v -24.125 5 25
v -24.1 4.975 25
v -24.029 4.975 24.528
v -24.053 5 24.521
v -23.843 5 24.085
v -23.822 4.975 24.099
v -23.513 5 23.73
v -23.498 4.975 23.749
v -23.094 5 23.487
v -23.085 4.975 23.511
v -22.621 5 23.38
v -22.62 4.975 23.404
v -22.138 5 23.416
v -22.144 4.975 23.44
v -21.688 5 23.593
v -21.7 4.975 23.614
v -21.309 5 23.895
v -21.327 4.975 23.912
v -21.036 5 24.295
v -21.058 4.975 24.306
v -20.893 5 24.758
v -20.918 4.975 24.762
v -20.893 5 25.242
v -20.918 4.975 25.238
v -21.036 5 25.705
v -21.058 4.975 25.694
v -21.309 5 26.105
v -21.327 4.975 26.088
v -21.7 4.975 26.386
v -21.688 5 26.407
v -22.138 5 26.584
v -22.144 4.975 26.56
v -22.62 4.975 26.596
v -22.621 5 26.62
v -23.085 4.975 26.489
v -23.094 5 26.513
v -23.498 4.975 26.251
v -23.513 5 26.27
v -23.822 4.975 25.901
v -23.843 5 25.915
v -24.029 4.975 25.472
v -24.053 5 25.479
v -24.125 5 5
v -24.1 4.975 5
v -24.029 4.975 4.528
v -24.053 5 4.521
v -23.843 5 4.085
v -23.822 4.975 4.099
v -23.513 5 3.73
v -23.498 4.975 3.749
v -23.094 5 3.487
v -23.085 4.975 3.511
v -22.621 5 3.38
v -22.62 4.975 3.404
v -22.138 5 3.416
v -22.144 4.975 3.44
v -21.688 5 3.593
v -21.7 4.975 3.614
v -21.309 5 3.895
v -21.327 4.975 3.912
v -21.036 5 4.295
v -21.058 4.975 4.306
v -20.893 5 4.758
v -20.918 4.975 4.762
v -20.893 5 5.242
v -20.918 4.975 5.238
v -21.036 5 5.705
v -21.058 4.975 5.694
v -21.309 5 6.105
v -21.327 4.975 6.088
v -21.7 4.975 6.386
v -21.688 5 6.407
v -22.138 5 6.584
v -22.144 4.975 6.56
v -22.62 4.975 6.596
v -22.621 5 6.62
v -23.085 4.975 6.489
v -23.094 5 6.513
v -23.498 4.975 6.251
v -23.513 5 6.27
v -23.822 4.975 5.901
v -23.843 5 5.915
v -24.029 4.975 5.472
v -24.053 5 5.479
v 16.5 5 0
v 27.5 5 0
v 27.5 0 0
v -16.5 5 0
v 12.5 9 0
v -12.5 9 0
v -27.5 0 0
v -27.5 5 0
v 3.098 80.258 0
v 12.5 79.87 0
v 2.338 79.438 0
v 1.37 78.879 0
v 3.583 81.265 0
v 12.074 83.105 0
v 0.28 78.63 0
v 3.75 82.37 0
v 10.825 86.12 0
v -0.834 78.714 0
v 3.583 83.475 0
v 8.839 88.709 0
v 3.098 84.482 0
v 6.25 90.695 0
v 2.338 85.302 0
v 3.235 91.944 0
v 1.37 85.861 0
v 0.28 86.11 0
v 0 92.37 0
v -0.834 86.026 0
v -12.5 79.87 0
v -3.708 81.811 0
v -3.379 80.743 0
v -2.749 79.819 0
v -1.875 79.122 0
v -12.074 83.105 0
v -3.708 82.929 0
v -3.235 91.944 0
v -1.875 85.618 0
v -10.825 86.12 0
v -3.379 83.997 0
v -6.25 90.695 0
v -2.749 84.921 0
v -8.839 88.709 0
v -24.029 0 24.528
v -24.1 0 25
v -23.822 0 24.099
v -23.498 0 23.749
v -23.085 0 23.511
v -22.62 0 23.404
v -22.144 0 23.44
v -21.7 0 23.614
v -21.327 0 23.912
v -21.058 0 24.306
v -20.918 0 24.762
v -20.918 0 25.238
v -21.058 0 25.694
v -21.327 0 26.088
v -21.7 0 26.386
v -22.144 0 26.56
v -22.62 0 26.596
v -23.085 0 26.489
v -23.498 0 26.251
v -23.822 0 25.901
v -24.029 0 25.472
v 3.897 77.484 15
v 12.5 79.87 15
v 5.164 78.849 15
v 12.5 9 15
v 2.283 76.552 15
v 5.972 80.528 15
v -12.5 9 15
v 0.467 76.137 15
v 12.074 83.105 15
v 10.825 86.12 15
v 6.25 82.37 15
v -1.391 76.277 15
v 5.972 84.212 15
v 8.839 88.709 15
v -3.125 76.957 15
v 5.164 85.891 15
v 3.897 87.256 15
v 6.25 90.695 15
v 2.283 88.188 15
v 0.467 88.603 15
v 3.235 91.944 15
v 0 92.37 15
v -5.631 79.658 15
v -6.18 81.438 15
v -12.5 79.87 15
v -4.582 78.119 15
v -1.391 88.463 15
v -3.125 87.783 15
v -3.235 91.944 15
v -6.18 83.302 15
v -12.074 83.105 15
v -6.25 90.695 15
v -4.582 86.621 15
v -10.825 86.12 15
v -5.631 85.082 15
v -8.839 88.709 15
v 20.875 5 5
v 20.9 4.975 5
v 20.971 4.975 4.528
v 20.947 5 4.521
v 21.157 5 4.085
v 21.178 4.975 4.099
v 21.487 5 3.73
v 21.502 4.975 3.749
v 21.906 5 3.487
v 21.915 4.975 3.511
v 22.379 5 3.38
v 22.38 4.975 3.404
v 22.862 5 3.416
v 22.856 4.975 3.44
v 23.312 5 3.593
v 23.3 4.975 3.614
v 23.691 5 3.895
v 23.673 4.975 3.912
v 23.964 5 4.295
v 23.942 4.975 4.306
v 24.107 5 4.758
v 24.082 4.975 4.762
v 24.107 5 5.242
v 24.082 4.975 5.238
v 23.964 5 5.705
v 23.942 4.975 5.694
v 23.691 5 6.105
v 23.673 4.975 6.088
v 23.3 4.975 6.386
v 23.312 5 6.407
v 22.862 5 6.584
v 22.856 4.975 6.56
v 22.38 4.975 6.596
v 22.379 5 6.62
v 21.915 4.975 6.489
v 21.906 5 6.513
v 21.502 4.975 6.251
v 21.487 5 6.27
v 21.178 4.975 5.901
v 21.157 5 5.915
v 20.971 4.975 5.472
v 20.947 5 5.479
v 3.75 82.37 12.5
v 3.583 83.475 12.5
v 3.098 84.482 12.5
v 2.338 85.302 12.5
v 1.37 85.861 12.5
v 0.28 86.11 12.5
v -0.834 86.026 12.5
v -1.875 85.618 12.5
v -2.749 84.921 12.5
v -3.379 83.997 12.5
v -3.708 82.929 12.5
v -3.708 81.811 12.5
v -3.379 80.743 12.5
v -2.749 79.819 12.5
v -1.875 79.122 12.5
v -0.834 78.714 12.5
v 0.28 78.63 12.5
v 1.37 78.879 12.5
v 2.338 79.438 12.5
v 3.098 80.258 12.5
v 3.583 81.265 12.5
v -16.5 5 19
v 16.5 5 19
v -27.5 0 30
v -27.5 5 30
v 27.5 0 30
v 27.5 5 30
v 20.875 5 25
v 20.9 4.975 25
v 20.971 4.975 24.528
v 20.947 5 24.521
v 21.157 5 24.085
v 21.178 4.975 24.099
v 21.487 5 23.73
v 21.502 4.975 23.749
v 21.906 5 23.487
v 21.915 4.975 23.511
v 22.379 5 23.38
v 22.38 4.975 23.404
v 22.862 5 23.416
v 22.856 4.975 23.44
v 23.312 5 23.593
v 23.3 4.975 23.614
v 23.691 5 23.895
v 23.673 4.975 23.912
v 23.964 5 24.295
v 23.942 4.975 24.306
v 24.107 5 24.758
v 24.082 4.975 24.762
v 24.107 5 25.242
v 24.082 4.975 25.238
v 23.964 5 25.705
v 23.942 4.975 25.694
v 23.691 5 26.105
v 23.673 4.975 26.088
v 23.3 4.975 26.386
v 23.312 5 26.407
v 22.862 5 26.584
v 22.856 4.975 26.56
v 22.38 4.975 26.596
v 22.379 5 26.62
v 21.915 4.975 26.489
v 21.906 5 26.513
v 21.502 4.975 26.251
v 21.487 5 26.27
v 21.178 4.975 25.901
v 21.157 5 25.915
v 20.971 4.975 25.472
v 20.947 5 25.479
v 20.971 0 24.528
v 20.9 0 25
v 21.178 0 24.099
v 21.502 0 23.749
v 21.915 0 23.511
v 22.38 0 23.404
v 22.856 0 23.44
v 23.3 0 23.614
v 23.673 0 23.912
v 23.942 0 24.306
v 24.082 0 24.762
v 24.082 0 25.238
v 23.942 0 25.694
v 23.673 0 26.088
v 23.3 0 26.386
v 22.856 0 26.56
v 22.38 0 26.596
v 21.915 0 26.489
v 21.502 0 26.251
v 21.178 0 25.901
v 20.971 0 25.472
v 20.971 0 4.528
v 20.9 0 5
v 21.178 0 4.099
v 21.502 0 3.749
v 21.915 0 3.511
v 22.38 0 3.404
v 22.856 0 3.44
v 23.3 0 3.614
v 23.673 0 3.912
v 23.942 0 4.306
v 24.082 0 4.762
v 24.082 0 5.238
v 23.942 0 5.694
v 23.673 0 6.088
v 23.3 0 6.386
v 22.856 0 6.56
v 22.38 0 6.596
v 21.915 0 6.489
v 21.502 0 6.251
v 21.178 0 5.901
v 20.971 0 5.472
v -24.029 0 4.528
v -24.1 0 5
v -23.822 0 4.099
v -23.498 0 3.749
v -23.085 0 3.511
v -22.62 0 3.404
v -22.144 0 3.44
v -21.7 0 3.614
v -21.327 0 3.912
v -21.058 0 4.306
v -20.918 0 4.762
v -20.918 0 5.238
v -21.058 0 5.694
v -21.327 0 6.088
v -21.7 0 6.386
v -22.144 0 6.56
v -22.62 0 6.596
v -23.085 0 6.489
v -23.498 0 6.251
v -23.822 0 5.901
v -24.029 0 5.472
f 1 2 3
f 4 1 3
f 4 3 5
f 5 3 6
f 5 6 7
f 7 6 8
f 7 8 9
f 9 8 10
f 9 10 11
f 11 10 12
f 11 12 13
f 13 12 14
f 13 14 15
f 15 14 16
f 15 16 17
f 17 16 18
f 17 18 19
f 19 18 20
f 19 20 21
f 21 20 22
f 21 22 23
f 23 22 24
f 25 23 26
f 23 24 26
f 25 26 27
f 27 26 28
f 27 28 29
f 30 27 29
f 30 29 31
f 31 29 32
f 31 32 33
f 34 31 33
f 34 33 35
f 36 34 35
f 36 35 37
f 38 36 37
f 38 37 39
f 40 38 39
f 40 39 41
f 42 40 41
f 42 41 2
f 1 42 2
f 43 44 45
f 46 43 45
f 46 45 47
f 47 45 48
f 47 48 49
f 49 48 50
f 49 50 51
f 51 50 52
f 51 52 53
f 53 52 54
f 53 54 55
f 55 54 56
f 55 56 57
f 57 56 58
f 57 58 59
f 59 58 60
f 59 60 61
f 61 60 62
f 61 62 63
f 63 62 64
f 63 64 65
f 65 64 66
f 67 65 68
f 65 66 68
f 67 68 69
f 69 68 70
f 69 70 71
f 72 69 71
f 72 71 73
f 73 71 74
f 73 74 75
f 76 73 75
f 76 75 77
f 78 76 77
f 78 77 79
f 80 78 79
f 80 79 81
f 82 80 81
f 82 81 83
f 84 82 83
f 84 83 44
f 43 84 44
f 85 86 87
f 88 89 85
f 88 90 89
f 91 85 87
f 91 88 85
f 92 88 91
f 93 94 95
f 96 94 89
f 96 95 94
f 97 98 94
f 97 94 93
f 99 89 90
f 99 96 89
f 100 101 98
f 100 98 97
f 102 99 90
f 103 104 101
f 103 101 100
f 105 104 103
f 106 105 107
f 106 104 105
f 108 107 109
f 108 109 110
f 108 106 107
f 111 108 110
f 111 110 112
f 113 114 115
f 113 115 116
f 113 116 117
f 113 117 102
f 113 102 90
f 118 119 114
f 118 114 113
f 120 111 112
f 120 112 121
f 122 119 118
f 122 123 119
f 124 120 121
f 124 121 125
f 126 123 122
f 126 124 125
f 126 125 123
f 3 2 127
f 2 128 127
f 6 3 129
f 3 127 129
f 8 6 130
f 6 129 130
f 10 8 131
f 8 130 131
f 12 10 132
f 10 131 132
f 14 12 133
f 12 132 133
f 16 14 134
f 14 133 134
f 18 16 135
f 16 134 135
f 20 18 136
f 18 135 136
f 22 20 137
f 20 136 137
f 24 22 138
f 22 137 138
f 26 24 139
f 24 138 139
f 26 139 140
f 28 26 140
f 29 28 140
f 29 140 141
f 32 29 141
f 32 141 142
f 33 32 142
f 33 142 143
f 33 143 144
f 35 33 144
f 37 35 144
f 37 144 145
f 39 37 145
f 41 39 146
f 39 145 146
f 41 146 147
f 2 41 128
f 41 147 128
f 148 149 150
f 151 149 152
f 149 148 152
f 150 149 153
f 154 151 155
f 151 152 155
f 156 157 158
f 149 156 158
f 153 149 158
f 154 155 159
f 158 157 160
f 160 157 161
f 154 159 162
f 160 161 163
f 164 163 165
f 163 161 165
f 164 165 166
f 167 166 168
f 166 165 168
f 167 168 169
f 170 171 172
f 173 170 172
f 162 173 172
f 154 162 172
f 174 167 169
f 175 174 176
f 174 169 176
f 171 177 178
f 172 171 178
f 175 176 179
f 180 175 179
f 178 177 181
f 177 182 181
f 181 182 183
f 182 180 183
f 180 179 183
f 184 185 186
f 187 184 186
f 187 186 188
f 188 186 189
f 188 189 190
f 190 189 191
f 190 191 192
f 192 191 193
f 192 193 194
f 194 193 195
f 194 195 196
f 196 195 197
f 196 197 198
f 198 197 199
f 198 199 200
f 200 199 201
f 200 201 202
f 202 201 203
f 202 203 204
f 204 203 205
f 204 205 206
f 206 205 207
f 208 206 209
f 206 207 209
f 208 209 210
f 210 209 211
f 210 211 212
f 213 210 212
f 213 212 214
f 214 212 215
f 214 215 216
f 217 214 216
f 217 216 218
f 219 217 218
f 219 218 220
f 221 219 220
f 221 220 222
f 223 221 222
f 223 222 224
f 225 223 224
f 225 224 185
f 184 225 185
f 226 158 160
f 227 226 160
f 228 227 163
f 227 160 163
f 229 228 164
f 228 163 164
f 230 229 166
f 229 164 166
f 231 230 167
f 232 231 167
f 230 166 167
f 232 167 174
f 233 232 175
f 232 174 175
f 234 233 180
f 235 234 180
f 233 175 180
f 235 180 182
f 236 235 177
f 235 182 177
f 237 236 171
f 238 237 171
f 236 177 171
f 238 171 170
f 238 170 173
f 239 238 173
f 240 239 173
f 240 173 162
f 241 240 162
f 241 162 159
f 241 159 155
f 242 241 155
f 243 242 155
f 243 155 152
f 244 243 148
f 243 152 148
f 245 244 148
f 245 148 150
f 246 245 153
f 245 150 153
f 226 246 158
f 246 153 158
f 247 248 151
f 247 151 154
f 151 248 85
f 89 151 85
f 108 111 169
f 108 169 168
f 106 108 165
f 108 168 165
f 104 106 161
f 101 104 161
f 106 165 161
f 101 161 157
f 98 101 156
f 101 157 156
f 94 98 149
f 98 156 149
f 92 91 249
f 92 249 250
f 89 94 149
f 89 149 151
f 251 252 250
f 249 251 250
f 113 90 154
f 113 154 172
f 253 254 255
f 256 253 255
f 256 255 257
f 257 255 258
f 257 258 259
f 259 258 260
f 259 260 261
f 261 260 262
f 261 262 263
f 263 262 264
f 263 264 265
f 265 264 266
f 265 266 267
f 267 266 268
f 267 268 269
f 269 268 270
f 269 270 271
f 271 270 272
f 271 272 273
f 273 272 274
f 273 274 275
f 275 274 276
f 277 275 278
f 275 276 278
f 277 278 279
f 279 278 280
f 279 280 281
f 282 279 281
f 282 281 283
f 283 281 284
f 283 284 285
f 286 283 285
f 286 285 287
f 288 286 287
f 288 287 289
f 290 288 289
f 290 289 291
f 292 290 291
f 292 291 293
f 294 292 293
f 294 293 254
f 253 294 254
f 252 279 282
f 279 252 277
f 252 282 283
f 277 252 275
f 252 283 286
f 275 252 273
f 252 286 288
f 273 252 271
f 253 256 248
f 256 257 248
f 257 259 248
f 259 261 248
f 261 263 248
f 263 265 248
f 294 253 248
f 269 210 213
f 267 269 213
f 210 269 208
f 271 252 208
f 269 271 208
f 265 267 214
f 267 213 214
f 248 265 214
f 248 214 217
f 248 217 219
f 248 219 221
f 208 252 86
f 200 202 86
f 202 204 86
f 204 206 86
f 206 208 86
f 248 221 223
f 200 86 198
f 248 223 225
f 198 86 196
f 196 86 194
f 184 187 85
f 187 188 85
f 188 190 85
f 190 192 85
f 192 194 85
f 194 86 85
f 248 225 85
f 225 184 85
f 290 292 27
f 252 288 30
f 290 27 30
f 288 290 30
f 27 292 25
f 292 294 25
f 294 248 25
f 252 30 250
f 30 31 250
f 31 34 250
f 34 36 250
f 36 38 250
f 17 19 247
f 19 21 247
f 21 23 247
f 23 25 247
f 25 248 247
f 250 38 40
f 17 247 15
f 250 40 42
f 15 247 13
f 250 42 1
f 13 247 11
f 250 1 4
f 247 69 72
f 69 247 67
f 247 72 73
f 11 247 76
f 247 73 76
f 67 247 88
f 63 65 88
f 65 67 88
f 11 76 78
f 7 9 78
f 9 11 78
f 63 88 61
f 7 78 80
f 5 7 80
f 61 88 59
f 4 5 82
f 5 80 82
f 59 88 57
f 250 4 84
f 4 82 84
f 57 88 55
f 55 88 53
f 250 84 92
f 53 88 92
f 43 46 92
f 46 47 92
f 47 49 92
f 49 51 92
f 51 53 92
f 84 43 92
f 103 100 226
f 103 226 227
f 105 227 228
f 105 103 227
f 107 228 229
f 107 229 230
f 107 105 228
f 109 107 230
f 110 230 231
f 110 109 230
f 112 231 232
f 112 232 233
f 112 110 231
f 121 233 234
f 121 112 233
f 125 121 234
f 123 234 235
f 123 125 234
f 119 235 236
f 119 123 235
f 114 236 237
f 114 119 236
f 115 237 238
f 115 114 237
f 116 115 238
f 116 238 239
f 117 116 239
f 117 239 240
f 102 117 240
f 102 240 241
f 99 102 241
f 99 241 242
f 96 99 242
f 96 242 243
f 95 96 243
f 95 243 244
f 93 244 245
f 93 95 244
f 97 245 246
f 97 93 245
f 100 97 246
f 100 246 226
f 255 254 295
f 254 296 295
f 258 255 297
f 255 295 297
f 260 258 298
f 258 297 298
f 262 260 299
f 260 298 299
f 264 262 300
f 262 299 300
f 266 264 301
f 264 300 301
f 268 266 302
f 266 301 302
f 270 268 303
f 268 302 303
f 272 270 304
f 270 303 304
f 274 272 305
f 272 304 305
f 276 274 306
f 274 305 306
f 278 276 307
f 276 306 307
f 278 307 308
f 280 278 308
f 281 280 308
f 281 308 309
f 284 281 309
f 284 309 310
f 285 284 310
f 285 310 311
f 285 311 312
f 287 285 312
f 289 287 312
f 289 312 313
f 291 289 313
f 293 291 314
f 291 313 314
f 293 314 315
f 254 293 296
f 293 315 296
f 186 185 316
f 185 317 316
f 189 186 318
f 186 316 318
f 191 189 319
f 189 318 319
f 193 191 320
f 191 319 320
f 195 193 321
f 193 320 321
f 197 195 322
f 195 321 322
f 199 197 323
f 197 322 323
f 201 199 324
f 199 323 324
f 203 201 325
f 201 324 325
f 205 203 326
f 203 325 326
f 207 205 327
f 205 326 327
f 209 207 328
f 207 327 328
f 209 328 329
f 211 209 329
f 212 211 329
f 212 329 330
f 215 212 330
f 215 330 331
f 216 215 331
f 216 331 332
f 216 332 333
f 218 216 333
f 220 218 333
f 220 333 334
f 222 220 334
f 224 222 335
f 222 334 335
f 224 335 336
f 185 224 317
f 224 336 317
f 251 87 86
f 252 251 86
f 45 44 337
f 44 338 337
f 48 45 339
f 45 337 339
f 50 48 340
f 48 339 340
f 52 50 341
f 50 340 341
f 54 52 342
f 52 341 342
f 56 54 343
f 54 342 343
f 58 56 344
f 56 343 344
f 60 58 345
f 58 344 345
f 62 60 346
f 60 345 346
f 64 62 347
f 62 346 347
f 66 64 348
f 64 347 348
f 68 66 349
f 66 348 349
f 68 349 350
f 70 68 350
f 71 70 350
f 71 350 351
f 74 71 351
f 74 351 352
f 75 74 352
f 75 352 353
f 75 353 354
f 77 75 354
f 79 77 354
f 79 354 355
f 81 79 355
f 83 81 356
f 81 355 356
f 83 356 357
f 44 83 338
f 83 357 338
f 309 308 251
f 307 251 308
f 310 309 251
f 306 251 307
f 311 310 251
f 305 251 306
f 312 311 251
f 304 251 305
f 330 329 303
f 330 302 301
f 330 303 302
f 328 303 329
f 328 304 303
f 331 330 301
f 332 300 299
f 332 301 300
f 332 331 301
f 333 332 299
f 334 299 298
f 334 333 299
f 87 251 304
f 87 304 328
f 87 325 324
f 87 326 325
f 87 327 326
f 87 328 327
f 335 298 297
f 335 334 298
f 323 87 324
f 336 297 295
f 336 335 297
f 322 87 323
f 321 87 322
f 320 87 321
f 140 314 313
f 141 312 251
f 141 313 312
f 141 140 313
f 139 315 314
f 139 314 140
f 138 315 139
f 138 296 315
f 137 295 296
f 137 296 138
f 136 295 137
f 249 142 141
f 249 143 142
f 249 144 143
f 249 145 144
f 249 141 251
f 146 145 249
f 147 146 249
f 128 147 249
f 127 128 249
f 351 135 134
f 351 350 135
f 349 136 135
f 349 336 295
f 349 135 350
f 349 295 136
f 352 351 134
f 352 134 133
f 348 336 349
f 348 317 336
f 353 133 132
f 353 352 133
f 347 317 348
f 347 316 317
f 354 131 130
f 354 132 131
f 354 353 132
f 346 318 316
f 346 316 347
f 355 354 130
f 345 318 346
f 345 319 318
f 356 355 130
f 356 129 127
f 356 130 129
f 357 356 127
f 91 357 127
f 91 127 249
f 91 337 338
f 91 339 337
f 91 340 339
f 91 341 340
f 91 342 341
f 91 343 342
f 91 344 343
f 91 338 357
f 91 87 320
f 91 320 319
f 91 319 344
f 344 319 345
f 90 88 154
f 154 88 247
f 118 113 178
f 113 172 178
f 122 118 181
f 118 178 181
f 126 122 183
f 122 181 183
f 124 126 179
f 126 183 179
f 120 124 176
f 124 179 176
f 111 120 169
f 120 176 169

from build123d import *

# Parameters (mm, degrees)
SKETCH1_R                            = 3.75
BOSS_EXTRUDE1_DEPTH                  = 15
SKETCH2_W                            = 55
SKETCH2_H                            = 5
BOSS_EXTRUDE2_DEPTH                  = 30
F_3_2_3_2_DIAMETER_HOLE1_D           = 3.2
F_3_2_3_2_DIAMETER_HOLE1_CSINK_D     = 3.25
F_3_2_3_2_DIAMETER_HOLE1_CSINK_ANGLE = 90
CHAMFER1_SIZE                        = 4
FILLET2_R                            = 12.5
CHAMFER2_SIZE                        = 2.5


with BuildPart() as part:
    # Sketch1 → Boss-Extrude1 (new body)
    with BuildSketch(Plane.XY):
        Polygon((0, 0), (-12.5, 0), (-12.5, 92.37), (12.5, 92.37), (12.5, 0), align=None)
        with Locations((0, 82.37)):
            Circle(SKETCH1_R, mode=Mode.SUBTRACT)
    extrude(amount=BOSS_EXTRUDE1_DEPTH)

    # Sketch2 → Boss-Extrude2 (add)
    with BuildSketch(Plane(origin=(0, 0, 0), x_dir=(-1, 0, 0), z_dir=(0, 0, -1))):
        with Locations((0, 2.5)):
            Rectangle(SKETCH2_W, SKETCH2_H)
    extrude(amount=-BOSS_EXTRUDE2_DEPTH)

    # Ø3.2 (3.2) Diameter Hole1 (through all)
    with Locations(Plane(origin=(0, 5, 0), x_dir=(1, 0, 0), z_dir=(0, 1, 0))):
        with Locations((-22.5, -5), (-22.5, -25), (22.5, -25), (22.5, -5)):
            CounterSinkHole(F_3_2_3_2_DIAMETER_HOLE1_D / 2, F_3_2_3_2_DIAMETER_HOLE1_CSINK_D / 2, counter_sink_angle=F_3_2_3_2_DIAMETER_HOLE1_CSINK_ANGLE)

    # Chamfer1
    chamfer1_edges = [part.edges().sort_by_distance(p)[0] for p in [
        (-12.5, 5, 7.5),
        (0, 5, 15),
        (12.5, 5, 7.5),
    ]]
    chamfer(chamfer1_edges, length=CHAMFER1_SIZE)

    # Fillet2
    fillet2_edges = [part.edges().sort_by_distance(p)[0] for p in [
        (12.5, 92.37, 7.5),
        (-12.5, 92.37, 7.5),
    ]]
    fillet(fillet2_edges, radius=FILLET2_R - 0.0001)  # a hair under: the kernel refuses the full size

    # Chamfer2
    chamfer2_edges = [part.edges().sort_by_distance(p)[0] for p in [
        (-3.75, 82.37, 15),
    ]]
    chamfer(chamfer2_edges, length=CHAMFER2_SIZE)


solid = part.part
